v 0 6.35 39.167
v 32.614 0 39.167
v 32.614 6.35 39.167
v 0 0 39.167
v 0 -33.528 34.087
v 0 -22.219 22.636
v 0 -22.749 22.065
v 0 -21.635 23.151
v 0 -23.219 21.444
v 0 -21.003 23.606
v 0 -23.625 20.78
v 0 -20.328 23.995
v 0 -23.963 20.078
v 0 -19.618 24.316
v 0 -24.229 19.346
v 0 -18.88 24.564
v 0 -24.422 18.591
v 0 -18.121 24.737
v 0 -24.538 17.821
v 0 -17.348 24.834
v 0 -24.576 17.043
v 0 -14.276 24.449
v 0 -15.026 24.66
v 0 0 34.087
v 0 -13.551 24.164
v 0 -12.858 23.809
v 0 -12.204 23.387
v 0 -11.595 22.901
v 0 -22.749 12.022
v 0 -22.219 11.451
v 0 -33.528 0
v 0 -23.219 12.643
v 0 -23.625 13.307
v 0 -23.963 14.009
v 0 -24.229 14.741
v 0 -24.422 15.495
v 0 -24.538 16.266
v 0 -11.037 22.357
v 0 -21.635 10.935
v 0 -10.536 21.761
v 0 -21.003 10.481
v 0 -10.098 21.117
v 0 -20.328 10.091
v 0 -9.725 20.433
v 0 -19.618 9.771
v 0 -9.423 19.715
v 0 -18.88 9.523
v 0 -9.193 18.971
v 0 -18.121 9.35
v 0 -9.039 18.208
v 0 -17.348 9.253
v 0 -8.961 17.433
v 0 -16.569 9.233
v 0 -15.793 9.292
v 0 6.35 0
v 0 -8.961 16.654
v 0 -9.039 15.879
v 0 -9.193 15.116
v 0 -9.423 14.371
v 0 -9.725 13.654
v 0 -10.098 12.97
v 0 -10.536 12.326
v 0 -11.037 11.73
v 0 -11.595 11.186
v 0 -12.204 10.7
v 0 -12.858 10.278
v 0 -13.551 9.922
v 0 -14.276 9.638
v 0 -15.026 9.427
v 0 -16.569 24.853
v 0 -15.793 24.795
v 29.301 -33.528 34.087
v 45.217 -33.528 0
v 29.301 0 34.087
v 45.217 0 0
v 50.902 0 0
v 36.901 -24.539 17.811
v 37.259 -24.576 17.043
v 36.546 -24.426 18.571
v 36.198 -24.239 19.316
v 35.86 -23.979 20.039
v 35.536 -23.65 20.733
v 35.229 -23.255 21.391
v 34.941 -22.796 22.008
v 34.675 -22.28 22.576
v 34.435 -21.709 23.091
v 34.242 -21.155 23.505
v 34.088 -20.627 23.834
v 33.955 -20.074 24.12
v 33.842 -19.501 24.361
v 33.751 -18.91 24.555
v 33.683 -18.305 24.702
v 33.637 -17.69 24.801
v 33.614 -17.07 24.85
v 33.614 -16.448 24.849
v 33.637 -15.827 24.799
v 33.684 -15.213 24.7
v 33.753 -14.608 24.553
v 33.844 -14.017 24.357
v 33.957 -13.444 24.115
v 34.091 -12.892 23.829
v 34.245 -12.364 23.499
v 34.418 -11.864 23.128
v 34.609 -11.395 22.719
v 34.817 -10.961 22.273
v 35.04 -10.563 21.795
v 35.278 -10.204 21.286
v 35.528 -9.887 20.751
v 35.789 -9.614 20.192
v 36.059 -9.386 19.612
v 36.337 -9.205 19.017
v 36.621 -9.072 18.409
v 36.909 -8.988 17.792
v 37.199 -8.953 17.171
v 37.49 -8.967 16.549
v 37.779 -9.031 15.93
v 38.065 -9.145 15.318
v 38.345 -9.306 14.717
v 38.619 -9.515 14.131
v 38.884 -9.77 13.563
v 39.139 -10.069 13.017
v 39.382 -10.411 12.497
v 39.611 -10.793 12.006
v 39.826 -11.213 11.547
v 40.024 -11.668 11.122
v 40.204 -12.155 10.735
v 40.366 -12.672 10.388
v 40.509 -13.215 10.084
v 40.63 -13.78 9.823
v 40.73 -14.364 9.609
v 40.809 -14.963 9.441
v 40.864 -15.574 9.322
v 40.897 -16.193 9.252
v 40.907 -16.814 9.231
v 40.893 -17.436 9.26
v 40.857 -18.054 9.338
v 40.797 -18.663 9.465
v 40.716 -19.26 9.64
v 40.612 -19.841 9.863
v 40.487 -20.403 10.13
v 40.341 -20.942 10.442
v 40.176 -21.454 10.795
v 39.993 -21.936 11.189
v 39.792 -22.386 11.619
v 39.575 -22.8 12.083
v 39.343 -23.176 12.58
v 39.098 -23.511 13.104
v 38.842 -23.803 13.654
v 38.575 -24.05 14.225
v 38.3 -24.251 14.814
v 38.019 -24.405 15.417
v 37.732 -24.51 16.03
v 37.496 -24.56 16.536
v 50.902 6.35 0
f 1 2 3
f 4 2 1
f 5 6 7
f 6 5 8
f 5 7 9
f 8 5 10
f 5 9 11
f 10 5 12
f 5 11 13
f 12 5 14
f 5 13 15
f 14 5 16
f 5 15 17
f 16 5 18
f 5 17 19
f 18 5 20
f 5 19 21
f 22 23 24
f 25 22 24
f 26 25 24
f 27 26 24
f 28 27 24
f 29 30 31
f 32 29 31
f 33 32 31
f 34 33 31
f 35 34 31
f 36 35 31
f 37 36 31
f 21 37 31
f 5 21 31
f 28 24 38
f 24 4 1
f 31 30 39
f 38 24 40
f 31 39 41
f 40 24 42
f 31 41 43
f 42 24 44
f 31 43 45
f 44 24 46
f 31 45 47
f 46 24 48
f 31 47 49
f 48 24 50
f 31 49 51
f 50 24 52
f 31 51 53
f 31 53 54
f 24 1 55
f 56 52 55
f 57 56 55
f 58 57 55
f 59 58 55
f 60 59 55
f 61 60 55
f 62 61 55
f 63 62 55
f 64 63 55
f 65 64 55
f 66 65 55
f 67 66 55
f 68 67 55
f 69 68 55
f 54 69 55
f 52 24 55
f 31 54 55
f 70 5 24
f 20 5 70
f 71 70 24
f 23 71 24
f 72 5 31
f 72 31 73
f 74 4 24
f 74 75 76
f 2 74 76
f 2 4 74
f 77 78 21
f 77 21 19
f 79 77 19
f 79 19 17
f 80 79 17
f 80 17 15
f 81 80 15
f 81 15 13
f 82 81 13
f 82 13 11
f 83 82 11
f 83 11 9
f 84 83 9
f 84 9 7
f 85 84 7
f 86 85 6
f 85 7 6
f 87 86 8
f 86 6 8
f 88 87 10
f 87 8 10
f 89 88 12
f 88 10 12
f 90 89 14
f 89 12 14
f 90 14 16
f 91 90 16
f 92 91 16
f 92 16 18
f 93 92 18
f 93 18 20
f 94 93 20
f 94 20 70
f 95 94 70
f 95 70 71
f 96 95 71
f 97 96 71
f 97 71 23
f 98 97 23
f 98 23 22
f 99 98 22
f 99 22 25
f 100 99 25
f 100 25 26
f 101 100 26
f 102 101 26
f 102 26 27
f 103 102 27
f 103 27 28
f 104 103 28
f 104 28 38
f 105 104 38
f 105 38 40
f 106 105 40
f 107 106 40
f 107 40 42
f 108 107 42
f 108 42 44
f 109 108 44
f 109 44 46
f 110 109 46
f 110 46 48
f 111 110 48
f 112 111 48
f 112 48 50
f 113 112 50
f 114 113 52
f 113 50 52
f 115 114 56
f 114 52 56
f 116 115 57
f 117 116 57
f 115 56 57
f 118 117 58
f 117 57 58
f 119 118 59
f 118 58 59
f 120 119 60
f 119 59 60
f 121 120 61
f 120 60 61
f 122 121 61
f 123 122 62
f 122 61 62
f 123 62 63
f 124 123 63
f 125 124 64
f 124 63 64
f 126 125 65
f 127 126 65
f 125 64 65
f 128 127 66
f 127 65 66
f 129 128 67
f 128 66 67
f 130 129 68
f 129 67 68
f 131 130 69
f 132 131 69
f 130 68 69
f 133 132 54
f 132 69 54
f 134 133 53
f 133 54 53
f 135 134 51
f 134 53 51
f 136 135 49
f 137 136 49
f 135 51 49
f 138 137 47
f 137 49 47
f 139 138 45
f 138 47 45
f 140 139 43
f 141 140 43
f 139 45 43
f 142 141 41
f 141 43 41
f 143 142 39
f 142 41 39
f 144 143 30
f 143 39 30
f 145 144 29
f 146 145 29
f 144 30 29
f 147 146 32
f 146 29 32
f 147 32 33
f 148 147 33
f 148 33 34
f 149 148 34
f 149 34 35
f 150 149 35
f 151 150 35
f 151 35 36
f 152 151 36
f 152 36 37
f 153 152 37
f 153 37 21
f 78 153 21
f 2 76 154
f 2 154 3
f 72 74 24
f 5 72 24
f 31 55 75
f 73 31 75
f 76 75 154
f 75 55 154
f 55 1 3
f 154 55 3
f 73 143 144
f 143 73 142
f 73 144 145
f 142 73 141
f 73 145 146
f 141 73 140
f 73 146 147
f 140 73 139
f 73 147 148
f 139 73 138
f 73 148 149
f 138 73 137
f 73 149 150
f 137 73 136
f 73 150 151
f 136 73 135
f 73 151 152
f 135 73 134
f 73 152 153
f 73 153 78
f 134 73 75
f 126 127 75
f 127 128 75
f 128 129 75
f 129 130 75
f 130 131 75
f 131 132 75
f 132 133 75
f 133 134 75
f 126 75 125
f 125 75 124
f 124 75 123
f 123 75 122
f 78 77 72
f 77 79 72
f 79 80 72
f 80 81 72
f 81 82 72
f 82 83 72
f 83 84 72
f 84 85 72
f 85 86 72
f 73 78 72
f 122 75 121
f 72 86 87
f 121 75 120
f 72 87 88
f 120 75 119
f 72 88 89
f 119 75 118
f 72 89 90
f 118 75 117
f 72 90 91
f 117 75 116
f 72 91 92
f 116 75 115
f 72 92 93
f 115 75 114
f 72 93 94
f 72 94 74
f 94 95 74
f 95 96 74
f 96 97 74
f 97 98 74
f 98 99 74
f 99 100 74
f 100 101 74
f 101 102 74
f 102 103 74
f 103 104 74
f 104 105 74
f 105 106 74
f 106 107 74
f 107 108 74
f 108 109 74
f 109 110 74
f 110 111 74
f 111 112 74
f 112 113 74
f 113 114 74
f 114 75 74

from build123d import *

# Parameters (mm, degrees)
F1_DEPTH = 6.35
F3_DEPTH = 33.528
F4_R     = 7.812407
F5_DEPTH = 76.2


with BuildPart() as f1:
    # F0 (on Front) → F1 (new body)
    with BuildSketch(Plane.XZ):
        Polygon((0, 39.166801), (0, 0), (50.901599, 0), (32.613602, 39.166801), align=None)
    extrude(amount=-F1_DEPTH)

    # F2 (on face) → F3 (join)
    with BuildSketch(Plane.XZ):
        Polygon((45.216922, 0), (29.300908, 34.086801), (0, 34.086801), (0, 0), align=None)
    extrude(amount=F3_DEPTH)

    # F4 (on face) → F5 (cut)
    with BuildSketch(Plane(origin=(0, 0, 0), x_dir=(0, -1, 0), z_dir=(-1, 0, 0))):
        with Locations((16.764, 17.0434)):
            Circle(F4_R)
    extrude(amount=-F5_DEPTH, mode=Mode.SUBTRACT)


solid = f1.part
